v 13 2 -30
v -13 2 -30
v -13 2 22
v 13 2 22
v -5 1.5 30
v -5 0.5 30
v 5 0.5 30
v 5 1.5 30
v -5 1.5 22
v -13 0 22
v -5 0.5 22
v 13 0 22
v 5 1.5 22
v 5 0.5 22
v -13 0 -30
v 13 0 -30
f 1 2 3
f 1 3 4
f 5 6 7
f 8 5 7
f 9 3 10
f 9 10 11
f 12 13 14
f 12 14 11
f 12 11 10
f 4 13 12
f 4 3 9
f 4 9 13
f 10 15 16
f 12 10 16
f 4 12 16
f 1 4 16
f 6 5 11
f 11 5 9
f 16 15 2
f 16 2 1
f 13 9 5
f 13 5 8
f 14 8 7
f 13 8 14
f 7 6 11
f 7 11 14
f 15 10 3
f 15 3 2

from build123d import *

# Parameters (mm, degrees)
SKETCH1_W           = 26
SKETCH1_H           = 60
BOSS_EXTRUDE1_DEPTH = 2
SKETCH9_W           = 8
SKETCH9_H           = 8
CUT_EXTRUDE1_DEPTH  = 2
SKETCH10_W          = 10
SKETCH10_H          = 8
CUT_EXTRUDE2_DEPTH  = 0.5
SKETCH11_W          = 10
SKETCH11_H          = 8
CUT_EXTRUDE3_DEPTH  = 0.5


with BuildPart() as part:
    # Sketch1 → Boss-Extrude1 (new body)
    with BuildSketch(Plane(origin=(0, 0, 0), x_dir=(1, 0, 0), z_dir=(0, 1, 0))):
        Rectangle(SKETCH1_W, SKETCH1_H)
    extrude(amount=BOSS_EXTRUDE1_DEPTH)

    # Sketch9 → Cut-Extrude1 (cut)
    with BuildSketch(Plane(origin=(0, 2, 0), x_dir=(1, 0, 0), z_dir=(0, 1, 0))):
        with Locations((-9, -26)):
            Rectangle(SKETCH9_W, SKETCH9_H)
        with Locations((9, -26)):
            Rectangle(SKETCH9_W, SKETCH9_H)
    extrude(amount=-CUT_EXTRUDE1_DEPTH, mode=Mode.SUBTRACT)

    # Sketch10 → Cut-Extrude2 (cut)
    with BuildSketch(Plane(origin=(0, 2, 0), x_dir=(1, 0, 0), z_dir=(0, 1, 0))):
        with Locations((0, -26)):
            Rectangle(SKETCH10_W, SKETCH10_H)
    extrude(amount=-CUT_EXTRUDE2_DEPTH, mode=Mode.SUBTRACT)

    # Sketch11 → Cut-Extrude3 (cut)
    with BuildSketch(Plane.XZ):
        with Locations((0, 26)):
            Rectangle(SKETCH11_W, SKETCH11_H)
    extrude(amount=-CUT_EXTRUDE3_DEPTH, mode=Mode.SUBTRACT)


solid = part.part
